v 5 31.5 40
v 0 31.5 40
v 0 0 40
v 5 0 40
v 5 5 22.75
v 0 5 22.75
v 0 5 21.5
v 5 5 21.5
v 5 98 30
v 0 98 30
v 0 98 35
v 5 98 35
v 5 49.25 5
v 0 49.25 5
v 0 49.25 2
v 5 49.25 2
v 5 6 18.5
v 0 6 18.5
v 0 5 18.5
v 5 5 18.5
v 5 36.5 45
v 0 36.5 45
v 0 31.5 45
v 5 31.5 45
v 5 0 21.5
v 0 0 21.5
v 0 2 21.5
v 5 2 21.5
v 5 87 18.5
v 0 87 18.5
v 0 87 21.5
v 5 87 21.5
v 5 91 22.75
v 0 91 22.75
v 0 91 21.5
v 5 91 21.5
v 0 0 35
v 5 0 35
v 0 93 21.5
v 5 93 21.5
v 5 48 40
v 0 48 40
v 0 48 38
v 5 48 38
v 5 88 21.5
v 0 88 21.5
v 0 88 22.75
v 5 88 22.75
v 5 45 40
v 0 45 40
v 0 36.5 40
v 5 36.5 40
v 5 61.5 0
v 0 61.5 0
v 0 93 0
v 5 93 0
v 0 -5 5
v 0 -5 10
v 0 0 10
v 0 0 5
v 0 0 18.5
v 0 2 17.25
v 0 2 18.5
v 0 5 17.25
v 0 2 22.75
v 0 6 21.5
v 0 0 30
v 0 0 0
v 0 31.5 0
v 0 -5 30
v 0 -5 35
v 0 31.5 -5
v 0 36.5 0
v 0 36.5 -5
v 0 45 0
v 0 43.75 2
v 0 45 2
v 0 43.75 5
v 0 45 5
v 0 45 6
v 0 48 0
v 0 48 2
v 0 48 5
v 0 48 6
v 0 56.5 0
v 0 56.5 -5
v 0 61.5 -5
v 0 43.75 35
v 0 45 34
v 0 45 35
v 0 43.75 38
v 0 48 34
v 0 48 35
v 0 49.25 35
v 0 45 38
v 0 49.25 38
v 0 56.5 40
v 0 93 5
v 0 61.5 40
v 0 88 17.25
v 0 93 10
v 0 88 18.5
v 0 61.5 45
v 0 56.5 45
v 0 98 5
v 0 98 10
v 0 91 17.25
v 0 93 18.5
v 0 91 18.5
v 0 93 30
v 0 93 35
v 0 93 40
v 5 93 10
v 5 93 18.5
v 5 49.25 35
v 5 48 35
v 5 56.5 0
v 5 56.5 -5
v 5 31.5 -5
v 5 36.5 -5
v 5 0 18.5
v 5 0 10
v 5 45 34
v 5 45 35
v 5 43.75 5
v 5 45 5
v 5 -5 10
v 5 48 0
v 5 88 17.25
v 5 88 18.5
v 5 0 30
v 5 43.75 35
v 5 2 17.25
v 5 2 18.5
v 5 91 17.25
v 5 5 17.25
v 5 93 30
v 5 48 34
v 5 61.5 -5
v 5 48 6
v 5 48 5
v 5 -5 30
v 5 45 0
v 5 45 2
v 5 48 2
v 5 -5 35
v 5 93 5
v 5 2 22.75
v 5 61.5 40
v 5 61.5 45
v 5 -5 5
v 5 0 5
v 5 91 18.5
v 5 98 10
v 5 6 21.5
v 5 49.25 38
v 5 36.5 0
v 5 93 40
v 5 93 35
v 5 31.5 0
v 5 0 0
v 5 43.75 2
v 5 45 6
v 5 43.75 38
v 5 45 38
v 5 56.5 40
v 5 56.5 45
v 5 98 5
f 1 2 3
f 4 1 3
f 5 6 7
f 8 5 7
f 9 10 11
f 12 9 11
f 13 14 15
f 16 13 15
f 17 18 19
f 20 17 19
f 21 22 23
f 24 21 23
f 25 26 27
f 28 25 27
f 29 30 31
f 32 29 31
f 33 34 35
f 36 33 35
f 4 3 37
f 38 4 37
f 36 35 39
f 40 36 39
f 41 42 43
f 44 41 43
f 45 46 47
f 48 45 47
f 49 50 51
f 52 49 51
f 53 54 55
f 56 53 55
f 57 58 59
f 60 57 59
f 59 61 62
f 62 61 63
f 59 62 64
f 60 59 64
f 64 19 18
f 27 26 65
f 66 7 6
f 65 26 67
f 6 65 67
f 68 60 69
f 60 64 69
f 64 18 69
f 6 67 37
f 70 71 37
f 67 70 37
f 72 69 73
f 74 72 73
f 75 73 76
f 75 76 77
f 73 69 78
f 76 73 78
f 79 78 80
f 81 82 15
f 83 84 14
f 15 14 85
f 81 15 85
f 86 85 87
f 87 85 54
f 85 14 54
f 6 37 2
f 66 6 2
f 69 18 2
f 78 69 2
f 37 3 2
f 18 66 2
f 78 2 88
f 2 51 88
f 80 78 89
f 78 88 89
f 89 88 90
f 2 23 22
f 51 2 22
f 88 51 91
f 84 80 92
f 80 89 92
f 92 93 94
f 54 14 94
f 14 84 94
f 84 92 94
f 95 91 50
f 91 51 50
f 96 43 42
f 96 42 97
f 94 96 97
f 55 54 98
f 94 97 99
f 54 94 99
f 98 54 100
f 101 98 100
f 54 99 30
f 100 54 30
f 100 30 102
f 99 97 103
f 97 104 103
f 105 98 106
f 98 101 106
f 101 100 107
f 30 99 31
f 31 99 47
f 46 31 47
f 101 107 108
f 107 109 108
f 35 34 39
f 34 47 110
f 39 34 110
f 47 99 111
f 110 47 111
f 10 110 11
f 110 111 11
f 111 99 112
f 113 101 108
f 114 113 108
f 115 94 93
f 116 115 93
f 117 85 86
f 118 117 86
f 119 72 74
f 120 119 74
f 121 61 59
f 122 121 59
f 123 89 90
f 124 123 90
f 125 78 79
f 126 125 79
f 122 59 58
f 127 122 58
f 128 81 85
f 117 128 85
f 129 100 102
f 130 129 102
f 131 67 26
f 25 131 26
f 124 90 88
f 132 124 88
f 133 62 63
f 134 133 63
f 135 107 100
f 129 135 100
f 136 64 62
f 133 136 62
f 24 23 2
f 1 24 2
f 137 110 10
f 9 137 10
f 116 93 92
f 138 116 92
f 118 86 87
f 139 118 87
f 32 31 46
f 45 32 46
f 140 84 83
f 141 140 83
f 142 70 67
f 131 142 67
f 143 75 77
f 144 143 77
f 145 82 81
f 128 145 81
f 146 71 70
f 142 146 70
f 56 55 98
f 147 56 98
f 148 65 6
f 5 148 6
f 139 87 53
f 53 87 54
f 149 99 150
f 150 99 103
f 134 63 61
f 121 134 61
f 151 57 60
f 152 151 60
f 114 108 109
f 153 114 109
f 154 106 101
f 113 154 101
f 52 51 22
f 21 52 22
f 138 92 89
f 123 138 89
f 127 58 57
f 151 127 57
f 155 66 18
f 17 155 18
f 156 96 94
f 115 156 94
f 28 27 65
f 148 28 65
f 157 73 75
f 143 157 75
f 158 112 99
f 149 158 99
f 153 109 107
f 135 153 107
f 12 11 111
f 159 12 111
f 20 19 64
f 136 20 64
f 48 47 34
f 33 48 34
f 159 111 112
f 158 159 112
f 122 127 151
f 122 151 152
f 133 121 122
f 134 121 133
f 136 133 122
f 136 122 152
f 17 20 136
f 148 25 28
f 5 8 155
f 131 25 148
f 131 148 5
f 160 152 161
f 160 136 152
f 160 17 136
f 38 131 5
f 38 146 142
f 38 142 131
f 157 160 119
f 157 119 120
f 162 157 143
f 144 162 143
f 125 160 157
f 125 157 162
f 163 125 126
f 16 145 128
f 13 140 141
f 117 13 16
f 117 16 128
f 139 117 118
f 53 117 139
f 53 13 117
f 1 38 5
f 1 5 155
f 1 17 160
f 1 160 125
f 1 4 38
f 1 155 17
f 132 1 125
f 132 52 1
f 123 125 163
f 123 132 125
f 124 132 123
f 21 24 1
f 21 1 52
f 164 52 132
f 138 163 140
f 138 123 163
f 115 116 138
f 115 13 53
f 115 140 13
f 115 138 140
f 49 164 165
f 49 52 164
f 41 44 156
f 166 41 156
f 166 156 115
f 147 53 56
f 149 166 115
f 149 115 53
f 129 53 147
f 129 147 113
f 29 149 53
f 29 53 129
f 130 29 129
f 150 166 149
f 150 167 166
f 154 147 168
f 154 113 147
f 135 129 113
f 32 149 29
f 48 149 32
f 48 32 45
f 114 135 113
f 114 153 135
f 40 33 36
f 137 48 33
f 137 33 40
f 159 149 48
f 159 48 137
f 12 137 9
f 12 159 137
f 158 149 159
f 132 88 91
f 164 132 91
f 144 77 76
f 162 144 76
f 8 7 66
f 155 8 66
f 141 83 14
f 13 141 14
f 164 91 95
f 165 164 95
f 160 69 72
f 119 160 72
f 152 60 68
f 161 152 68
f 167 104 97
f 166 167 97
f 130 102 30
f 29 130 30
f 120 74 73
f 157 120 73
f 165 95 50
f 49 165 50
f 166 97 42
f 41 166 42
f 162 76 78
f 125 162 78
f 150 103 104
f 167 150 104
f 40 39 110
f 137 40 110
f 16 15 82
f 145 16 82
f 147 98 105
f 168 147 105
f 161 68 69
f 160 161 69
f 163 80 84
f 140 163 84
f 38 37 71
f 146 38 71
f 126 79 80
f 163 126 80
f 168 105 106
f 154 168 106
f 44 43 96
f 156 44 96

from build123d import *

# Parameters (mm, degrees)
F2_DEPTH = 5


with BuildPart() as f2:
    # F1 (on Right) → F2 (new body)
    with BuildSketch(Plane.YZ):
        Polygon((0, 5), (0, 0), (31.5, 0), (31.5, -5), (36.5, -5), (36.5, 0), (45, 0), (45, 2), (43.75, 2), (43.75, 5), (45, 5), (45, 6), (48, 6), (48, 5), (49.25, 5), (49.25, 2), (48, 2), (48, 0), (56.5, 0), (56.5, -5), (61.5, -5), (61.5000005474, 0), (93, 0), (93, 5), (98, 5), (98, 10), (93, 10), (93, 18.5), (91, 18.5), (91, 17.25), (88, 17.25), (88, 18.5), (87, 18.5), (87, 21.5), (88, 21.5), (88, 22.75), (91, 22.75), (91, 21.5), (93, 21.5), (93, 30), (98, 30), (98, 35), (93, 35), (93, 40), (61.5000005474, 40), (61.5, 45), (56.5, 45), (56.5, 40), (48, 40), (48, 38), (49.25, 38), (49.25, 35), (48, 35), (48, 34), (45, 34), (45, 35), (43.75, 35), (43.75, 38), (45, 38), (45, 40), (36.5, 40), (36.5, 45), (31.5, 45), (31.5, 40), (0, 40), (0, 35), (-5, 35), (-5, 30), (0, 30), (0, 21.5), (2, 21.5), (2, 22.75), (5, 22.75), (5, 21.5), (6, 21.5), (6, 18.5), (5, 18.5), (5, 17.25), (2, 17.25), (2, 18.5), (0, 18.5), (0, 10), (-5, 10), (-5, 5), align=None)
    extrude(amount=F2_DEPTH)


solid = f2.part
